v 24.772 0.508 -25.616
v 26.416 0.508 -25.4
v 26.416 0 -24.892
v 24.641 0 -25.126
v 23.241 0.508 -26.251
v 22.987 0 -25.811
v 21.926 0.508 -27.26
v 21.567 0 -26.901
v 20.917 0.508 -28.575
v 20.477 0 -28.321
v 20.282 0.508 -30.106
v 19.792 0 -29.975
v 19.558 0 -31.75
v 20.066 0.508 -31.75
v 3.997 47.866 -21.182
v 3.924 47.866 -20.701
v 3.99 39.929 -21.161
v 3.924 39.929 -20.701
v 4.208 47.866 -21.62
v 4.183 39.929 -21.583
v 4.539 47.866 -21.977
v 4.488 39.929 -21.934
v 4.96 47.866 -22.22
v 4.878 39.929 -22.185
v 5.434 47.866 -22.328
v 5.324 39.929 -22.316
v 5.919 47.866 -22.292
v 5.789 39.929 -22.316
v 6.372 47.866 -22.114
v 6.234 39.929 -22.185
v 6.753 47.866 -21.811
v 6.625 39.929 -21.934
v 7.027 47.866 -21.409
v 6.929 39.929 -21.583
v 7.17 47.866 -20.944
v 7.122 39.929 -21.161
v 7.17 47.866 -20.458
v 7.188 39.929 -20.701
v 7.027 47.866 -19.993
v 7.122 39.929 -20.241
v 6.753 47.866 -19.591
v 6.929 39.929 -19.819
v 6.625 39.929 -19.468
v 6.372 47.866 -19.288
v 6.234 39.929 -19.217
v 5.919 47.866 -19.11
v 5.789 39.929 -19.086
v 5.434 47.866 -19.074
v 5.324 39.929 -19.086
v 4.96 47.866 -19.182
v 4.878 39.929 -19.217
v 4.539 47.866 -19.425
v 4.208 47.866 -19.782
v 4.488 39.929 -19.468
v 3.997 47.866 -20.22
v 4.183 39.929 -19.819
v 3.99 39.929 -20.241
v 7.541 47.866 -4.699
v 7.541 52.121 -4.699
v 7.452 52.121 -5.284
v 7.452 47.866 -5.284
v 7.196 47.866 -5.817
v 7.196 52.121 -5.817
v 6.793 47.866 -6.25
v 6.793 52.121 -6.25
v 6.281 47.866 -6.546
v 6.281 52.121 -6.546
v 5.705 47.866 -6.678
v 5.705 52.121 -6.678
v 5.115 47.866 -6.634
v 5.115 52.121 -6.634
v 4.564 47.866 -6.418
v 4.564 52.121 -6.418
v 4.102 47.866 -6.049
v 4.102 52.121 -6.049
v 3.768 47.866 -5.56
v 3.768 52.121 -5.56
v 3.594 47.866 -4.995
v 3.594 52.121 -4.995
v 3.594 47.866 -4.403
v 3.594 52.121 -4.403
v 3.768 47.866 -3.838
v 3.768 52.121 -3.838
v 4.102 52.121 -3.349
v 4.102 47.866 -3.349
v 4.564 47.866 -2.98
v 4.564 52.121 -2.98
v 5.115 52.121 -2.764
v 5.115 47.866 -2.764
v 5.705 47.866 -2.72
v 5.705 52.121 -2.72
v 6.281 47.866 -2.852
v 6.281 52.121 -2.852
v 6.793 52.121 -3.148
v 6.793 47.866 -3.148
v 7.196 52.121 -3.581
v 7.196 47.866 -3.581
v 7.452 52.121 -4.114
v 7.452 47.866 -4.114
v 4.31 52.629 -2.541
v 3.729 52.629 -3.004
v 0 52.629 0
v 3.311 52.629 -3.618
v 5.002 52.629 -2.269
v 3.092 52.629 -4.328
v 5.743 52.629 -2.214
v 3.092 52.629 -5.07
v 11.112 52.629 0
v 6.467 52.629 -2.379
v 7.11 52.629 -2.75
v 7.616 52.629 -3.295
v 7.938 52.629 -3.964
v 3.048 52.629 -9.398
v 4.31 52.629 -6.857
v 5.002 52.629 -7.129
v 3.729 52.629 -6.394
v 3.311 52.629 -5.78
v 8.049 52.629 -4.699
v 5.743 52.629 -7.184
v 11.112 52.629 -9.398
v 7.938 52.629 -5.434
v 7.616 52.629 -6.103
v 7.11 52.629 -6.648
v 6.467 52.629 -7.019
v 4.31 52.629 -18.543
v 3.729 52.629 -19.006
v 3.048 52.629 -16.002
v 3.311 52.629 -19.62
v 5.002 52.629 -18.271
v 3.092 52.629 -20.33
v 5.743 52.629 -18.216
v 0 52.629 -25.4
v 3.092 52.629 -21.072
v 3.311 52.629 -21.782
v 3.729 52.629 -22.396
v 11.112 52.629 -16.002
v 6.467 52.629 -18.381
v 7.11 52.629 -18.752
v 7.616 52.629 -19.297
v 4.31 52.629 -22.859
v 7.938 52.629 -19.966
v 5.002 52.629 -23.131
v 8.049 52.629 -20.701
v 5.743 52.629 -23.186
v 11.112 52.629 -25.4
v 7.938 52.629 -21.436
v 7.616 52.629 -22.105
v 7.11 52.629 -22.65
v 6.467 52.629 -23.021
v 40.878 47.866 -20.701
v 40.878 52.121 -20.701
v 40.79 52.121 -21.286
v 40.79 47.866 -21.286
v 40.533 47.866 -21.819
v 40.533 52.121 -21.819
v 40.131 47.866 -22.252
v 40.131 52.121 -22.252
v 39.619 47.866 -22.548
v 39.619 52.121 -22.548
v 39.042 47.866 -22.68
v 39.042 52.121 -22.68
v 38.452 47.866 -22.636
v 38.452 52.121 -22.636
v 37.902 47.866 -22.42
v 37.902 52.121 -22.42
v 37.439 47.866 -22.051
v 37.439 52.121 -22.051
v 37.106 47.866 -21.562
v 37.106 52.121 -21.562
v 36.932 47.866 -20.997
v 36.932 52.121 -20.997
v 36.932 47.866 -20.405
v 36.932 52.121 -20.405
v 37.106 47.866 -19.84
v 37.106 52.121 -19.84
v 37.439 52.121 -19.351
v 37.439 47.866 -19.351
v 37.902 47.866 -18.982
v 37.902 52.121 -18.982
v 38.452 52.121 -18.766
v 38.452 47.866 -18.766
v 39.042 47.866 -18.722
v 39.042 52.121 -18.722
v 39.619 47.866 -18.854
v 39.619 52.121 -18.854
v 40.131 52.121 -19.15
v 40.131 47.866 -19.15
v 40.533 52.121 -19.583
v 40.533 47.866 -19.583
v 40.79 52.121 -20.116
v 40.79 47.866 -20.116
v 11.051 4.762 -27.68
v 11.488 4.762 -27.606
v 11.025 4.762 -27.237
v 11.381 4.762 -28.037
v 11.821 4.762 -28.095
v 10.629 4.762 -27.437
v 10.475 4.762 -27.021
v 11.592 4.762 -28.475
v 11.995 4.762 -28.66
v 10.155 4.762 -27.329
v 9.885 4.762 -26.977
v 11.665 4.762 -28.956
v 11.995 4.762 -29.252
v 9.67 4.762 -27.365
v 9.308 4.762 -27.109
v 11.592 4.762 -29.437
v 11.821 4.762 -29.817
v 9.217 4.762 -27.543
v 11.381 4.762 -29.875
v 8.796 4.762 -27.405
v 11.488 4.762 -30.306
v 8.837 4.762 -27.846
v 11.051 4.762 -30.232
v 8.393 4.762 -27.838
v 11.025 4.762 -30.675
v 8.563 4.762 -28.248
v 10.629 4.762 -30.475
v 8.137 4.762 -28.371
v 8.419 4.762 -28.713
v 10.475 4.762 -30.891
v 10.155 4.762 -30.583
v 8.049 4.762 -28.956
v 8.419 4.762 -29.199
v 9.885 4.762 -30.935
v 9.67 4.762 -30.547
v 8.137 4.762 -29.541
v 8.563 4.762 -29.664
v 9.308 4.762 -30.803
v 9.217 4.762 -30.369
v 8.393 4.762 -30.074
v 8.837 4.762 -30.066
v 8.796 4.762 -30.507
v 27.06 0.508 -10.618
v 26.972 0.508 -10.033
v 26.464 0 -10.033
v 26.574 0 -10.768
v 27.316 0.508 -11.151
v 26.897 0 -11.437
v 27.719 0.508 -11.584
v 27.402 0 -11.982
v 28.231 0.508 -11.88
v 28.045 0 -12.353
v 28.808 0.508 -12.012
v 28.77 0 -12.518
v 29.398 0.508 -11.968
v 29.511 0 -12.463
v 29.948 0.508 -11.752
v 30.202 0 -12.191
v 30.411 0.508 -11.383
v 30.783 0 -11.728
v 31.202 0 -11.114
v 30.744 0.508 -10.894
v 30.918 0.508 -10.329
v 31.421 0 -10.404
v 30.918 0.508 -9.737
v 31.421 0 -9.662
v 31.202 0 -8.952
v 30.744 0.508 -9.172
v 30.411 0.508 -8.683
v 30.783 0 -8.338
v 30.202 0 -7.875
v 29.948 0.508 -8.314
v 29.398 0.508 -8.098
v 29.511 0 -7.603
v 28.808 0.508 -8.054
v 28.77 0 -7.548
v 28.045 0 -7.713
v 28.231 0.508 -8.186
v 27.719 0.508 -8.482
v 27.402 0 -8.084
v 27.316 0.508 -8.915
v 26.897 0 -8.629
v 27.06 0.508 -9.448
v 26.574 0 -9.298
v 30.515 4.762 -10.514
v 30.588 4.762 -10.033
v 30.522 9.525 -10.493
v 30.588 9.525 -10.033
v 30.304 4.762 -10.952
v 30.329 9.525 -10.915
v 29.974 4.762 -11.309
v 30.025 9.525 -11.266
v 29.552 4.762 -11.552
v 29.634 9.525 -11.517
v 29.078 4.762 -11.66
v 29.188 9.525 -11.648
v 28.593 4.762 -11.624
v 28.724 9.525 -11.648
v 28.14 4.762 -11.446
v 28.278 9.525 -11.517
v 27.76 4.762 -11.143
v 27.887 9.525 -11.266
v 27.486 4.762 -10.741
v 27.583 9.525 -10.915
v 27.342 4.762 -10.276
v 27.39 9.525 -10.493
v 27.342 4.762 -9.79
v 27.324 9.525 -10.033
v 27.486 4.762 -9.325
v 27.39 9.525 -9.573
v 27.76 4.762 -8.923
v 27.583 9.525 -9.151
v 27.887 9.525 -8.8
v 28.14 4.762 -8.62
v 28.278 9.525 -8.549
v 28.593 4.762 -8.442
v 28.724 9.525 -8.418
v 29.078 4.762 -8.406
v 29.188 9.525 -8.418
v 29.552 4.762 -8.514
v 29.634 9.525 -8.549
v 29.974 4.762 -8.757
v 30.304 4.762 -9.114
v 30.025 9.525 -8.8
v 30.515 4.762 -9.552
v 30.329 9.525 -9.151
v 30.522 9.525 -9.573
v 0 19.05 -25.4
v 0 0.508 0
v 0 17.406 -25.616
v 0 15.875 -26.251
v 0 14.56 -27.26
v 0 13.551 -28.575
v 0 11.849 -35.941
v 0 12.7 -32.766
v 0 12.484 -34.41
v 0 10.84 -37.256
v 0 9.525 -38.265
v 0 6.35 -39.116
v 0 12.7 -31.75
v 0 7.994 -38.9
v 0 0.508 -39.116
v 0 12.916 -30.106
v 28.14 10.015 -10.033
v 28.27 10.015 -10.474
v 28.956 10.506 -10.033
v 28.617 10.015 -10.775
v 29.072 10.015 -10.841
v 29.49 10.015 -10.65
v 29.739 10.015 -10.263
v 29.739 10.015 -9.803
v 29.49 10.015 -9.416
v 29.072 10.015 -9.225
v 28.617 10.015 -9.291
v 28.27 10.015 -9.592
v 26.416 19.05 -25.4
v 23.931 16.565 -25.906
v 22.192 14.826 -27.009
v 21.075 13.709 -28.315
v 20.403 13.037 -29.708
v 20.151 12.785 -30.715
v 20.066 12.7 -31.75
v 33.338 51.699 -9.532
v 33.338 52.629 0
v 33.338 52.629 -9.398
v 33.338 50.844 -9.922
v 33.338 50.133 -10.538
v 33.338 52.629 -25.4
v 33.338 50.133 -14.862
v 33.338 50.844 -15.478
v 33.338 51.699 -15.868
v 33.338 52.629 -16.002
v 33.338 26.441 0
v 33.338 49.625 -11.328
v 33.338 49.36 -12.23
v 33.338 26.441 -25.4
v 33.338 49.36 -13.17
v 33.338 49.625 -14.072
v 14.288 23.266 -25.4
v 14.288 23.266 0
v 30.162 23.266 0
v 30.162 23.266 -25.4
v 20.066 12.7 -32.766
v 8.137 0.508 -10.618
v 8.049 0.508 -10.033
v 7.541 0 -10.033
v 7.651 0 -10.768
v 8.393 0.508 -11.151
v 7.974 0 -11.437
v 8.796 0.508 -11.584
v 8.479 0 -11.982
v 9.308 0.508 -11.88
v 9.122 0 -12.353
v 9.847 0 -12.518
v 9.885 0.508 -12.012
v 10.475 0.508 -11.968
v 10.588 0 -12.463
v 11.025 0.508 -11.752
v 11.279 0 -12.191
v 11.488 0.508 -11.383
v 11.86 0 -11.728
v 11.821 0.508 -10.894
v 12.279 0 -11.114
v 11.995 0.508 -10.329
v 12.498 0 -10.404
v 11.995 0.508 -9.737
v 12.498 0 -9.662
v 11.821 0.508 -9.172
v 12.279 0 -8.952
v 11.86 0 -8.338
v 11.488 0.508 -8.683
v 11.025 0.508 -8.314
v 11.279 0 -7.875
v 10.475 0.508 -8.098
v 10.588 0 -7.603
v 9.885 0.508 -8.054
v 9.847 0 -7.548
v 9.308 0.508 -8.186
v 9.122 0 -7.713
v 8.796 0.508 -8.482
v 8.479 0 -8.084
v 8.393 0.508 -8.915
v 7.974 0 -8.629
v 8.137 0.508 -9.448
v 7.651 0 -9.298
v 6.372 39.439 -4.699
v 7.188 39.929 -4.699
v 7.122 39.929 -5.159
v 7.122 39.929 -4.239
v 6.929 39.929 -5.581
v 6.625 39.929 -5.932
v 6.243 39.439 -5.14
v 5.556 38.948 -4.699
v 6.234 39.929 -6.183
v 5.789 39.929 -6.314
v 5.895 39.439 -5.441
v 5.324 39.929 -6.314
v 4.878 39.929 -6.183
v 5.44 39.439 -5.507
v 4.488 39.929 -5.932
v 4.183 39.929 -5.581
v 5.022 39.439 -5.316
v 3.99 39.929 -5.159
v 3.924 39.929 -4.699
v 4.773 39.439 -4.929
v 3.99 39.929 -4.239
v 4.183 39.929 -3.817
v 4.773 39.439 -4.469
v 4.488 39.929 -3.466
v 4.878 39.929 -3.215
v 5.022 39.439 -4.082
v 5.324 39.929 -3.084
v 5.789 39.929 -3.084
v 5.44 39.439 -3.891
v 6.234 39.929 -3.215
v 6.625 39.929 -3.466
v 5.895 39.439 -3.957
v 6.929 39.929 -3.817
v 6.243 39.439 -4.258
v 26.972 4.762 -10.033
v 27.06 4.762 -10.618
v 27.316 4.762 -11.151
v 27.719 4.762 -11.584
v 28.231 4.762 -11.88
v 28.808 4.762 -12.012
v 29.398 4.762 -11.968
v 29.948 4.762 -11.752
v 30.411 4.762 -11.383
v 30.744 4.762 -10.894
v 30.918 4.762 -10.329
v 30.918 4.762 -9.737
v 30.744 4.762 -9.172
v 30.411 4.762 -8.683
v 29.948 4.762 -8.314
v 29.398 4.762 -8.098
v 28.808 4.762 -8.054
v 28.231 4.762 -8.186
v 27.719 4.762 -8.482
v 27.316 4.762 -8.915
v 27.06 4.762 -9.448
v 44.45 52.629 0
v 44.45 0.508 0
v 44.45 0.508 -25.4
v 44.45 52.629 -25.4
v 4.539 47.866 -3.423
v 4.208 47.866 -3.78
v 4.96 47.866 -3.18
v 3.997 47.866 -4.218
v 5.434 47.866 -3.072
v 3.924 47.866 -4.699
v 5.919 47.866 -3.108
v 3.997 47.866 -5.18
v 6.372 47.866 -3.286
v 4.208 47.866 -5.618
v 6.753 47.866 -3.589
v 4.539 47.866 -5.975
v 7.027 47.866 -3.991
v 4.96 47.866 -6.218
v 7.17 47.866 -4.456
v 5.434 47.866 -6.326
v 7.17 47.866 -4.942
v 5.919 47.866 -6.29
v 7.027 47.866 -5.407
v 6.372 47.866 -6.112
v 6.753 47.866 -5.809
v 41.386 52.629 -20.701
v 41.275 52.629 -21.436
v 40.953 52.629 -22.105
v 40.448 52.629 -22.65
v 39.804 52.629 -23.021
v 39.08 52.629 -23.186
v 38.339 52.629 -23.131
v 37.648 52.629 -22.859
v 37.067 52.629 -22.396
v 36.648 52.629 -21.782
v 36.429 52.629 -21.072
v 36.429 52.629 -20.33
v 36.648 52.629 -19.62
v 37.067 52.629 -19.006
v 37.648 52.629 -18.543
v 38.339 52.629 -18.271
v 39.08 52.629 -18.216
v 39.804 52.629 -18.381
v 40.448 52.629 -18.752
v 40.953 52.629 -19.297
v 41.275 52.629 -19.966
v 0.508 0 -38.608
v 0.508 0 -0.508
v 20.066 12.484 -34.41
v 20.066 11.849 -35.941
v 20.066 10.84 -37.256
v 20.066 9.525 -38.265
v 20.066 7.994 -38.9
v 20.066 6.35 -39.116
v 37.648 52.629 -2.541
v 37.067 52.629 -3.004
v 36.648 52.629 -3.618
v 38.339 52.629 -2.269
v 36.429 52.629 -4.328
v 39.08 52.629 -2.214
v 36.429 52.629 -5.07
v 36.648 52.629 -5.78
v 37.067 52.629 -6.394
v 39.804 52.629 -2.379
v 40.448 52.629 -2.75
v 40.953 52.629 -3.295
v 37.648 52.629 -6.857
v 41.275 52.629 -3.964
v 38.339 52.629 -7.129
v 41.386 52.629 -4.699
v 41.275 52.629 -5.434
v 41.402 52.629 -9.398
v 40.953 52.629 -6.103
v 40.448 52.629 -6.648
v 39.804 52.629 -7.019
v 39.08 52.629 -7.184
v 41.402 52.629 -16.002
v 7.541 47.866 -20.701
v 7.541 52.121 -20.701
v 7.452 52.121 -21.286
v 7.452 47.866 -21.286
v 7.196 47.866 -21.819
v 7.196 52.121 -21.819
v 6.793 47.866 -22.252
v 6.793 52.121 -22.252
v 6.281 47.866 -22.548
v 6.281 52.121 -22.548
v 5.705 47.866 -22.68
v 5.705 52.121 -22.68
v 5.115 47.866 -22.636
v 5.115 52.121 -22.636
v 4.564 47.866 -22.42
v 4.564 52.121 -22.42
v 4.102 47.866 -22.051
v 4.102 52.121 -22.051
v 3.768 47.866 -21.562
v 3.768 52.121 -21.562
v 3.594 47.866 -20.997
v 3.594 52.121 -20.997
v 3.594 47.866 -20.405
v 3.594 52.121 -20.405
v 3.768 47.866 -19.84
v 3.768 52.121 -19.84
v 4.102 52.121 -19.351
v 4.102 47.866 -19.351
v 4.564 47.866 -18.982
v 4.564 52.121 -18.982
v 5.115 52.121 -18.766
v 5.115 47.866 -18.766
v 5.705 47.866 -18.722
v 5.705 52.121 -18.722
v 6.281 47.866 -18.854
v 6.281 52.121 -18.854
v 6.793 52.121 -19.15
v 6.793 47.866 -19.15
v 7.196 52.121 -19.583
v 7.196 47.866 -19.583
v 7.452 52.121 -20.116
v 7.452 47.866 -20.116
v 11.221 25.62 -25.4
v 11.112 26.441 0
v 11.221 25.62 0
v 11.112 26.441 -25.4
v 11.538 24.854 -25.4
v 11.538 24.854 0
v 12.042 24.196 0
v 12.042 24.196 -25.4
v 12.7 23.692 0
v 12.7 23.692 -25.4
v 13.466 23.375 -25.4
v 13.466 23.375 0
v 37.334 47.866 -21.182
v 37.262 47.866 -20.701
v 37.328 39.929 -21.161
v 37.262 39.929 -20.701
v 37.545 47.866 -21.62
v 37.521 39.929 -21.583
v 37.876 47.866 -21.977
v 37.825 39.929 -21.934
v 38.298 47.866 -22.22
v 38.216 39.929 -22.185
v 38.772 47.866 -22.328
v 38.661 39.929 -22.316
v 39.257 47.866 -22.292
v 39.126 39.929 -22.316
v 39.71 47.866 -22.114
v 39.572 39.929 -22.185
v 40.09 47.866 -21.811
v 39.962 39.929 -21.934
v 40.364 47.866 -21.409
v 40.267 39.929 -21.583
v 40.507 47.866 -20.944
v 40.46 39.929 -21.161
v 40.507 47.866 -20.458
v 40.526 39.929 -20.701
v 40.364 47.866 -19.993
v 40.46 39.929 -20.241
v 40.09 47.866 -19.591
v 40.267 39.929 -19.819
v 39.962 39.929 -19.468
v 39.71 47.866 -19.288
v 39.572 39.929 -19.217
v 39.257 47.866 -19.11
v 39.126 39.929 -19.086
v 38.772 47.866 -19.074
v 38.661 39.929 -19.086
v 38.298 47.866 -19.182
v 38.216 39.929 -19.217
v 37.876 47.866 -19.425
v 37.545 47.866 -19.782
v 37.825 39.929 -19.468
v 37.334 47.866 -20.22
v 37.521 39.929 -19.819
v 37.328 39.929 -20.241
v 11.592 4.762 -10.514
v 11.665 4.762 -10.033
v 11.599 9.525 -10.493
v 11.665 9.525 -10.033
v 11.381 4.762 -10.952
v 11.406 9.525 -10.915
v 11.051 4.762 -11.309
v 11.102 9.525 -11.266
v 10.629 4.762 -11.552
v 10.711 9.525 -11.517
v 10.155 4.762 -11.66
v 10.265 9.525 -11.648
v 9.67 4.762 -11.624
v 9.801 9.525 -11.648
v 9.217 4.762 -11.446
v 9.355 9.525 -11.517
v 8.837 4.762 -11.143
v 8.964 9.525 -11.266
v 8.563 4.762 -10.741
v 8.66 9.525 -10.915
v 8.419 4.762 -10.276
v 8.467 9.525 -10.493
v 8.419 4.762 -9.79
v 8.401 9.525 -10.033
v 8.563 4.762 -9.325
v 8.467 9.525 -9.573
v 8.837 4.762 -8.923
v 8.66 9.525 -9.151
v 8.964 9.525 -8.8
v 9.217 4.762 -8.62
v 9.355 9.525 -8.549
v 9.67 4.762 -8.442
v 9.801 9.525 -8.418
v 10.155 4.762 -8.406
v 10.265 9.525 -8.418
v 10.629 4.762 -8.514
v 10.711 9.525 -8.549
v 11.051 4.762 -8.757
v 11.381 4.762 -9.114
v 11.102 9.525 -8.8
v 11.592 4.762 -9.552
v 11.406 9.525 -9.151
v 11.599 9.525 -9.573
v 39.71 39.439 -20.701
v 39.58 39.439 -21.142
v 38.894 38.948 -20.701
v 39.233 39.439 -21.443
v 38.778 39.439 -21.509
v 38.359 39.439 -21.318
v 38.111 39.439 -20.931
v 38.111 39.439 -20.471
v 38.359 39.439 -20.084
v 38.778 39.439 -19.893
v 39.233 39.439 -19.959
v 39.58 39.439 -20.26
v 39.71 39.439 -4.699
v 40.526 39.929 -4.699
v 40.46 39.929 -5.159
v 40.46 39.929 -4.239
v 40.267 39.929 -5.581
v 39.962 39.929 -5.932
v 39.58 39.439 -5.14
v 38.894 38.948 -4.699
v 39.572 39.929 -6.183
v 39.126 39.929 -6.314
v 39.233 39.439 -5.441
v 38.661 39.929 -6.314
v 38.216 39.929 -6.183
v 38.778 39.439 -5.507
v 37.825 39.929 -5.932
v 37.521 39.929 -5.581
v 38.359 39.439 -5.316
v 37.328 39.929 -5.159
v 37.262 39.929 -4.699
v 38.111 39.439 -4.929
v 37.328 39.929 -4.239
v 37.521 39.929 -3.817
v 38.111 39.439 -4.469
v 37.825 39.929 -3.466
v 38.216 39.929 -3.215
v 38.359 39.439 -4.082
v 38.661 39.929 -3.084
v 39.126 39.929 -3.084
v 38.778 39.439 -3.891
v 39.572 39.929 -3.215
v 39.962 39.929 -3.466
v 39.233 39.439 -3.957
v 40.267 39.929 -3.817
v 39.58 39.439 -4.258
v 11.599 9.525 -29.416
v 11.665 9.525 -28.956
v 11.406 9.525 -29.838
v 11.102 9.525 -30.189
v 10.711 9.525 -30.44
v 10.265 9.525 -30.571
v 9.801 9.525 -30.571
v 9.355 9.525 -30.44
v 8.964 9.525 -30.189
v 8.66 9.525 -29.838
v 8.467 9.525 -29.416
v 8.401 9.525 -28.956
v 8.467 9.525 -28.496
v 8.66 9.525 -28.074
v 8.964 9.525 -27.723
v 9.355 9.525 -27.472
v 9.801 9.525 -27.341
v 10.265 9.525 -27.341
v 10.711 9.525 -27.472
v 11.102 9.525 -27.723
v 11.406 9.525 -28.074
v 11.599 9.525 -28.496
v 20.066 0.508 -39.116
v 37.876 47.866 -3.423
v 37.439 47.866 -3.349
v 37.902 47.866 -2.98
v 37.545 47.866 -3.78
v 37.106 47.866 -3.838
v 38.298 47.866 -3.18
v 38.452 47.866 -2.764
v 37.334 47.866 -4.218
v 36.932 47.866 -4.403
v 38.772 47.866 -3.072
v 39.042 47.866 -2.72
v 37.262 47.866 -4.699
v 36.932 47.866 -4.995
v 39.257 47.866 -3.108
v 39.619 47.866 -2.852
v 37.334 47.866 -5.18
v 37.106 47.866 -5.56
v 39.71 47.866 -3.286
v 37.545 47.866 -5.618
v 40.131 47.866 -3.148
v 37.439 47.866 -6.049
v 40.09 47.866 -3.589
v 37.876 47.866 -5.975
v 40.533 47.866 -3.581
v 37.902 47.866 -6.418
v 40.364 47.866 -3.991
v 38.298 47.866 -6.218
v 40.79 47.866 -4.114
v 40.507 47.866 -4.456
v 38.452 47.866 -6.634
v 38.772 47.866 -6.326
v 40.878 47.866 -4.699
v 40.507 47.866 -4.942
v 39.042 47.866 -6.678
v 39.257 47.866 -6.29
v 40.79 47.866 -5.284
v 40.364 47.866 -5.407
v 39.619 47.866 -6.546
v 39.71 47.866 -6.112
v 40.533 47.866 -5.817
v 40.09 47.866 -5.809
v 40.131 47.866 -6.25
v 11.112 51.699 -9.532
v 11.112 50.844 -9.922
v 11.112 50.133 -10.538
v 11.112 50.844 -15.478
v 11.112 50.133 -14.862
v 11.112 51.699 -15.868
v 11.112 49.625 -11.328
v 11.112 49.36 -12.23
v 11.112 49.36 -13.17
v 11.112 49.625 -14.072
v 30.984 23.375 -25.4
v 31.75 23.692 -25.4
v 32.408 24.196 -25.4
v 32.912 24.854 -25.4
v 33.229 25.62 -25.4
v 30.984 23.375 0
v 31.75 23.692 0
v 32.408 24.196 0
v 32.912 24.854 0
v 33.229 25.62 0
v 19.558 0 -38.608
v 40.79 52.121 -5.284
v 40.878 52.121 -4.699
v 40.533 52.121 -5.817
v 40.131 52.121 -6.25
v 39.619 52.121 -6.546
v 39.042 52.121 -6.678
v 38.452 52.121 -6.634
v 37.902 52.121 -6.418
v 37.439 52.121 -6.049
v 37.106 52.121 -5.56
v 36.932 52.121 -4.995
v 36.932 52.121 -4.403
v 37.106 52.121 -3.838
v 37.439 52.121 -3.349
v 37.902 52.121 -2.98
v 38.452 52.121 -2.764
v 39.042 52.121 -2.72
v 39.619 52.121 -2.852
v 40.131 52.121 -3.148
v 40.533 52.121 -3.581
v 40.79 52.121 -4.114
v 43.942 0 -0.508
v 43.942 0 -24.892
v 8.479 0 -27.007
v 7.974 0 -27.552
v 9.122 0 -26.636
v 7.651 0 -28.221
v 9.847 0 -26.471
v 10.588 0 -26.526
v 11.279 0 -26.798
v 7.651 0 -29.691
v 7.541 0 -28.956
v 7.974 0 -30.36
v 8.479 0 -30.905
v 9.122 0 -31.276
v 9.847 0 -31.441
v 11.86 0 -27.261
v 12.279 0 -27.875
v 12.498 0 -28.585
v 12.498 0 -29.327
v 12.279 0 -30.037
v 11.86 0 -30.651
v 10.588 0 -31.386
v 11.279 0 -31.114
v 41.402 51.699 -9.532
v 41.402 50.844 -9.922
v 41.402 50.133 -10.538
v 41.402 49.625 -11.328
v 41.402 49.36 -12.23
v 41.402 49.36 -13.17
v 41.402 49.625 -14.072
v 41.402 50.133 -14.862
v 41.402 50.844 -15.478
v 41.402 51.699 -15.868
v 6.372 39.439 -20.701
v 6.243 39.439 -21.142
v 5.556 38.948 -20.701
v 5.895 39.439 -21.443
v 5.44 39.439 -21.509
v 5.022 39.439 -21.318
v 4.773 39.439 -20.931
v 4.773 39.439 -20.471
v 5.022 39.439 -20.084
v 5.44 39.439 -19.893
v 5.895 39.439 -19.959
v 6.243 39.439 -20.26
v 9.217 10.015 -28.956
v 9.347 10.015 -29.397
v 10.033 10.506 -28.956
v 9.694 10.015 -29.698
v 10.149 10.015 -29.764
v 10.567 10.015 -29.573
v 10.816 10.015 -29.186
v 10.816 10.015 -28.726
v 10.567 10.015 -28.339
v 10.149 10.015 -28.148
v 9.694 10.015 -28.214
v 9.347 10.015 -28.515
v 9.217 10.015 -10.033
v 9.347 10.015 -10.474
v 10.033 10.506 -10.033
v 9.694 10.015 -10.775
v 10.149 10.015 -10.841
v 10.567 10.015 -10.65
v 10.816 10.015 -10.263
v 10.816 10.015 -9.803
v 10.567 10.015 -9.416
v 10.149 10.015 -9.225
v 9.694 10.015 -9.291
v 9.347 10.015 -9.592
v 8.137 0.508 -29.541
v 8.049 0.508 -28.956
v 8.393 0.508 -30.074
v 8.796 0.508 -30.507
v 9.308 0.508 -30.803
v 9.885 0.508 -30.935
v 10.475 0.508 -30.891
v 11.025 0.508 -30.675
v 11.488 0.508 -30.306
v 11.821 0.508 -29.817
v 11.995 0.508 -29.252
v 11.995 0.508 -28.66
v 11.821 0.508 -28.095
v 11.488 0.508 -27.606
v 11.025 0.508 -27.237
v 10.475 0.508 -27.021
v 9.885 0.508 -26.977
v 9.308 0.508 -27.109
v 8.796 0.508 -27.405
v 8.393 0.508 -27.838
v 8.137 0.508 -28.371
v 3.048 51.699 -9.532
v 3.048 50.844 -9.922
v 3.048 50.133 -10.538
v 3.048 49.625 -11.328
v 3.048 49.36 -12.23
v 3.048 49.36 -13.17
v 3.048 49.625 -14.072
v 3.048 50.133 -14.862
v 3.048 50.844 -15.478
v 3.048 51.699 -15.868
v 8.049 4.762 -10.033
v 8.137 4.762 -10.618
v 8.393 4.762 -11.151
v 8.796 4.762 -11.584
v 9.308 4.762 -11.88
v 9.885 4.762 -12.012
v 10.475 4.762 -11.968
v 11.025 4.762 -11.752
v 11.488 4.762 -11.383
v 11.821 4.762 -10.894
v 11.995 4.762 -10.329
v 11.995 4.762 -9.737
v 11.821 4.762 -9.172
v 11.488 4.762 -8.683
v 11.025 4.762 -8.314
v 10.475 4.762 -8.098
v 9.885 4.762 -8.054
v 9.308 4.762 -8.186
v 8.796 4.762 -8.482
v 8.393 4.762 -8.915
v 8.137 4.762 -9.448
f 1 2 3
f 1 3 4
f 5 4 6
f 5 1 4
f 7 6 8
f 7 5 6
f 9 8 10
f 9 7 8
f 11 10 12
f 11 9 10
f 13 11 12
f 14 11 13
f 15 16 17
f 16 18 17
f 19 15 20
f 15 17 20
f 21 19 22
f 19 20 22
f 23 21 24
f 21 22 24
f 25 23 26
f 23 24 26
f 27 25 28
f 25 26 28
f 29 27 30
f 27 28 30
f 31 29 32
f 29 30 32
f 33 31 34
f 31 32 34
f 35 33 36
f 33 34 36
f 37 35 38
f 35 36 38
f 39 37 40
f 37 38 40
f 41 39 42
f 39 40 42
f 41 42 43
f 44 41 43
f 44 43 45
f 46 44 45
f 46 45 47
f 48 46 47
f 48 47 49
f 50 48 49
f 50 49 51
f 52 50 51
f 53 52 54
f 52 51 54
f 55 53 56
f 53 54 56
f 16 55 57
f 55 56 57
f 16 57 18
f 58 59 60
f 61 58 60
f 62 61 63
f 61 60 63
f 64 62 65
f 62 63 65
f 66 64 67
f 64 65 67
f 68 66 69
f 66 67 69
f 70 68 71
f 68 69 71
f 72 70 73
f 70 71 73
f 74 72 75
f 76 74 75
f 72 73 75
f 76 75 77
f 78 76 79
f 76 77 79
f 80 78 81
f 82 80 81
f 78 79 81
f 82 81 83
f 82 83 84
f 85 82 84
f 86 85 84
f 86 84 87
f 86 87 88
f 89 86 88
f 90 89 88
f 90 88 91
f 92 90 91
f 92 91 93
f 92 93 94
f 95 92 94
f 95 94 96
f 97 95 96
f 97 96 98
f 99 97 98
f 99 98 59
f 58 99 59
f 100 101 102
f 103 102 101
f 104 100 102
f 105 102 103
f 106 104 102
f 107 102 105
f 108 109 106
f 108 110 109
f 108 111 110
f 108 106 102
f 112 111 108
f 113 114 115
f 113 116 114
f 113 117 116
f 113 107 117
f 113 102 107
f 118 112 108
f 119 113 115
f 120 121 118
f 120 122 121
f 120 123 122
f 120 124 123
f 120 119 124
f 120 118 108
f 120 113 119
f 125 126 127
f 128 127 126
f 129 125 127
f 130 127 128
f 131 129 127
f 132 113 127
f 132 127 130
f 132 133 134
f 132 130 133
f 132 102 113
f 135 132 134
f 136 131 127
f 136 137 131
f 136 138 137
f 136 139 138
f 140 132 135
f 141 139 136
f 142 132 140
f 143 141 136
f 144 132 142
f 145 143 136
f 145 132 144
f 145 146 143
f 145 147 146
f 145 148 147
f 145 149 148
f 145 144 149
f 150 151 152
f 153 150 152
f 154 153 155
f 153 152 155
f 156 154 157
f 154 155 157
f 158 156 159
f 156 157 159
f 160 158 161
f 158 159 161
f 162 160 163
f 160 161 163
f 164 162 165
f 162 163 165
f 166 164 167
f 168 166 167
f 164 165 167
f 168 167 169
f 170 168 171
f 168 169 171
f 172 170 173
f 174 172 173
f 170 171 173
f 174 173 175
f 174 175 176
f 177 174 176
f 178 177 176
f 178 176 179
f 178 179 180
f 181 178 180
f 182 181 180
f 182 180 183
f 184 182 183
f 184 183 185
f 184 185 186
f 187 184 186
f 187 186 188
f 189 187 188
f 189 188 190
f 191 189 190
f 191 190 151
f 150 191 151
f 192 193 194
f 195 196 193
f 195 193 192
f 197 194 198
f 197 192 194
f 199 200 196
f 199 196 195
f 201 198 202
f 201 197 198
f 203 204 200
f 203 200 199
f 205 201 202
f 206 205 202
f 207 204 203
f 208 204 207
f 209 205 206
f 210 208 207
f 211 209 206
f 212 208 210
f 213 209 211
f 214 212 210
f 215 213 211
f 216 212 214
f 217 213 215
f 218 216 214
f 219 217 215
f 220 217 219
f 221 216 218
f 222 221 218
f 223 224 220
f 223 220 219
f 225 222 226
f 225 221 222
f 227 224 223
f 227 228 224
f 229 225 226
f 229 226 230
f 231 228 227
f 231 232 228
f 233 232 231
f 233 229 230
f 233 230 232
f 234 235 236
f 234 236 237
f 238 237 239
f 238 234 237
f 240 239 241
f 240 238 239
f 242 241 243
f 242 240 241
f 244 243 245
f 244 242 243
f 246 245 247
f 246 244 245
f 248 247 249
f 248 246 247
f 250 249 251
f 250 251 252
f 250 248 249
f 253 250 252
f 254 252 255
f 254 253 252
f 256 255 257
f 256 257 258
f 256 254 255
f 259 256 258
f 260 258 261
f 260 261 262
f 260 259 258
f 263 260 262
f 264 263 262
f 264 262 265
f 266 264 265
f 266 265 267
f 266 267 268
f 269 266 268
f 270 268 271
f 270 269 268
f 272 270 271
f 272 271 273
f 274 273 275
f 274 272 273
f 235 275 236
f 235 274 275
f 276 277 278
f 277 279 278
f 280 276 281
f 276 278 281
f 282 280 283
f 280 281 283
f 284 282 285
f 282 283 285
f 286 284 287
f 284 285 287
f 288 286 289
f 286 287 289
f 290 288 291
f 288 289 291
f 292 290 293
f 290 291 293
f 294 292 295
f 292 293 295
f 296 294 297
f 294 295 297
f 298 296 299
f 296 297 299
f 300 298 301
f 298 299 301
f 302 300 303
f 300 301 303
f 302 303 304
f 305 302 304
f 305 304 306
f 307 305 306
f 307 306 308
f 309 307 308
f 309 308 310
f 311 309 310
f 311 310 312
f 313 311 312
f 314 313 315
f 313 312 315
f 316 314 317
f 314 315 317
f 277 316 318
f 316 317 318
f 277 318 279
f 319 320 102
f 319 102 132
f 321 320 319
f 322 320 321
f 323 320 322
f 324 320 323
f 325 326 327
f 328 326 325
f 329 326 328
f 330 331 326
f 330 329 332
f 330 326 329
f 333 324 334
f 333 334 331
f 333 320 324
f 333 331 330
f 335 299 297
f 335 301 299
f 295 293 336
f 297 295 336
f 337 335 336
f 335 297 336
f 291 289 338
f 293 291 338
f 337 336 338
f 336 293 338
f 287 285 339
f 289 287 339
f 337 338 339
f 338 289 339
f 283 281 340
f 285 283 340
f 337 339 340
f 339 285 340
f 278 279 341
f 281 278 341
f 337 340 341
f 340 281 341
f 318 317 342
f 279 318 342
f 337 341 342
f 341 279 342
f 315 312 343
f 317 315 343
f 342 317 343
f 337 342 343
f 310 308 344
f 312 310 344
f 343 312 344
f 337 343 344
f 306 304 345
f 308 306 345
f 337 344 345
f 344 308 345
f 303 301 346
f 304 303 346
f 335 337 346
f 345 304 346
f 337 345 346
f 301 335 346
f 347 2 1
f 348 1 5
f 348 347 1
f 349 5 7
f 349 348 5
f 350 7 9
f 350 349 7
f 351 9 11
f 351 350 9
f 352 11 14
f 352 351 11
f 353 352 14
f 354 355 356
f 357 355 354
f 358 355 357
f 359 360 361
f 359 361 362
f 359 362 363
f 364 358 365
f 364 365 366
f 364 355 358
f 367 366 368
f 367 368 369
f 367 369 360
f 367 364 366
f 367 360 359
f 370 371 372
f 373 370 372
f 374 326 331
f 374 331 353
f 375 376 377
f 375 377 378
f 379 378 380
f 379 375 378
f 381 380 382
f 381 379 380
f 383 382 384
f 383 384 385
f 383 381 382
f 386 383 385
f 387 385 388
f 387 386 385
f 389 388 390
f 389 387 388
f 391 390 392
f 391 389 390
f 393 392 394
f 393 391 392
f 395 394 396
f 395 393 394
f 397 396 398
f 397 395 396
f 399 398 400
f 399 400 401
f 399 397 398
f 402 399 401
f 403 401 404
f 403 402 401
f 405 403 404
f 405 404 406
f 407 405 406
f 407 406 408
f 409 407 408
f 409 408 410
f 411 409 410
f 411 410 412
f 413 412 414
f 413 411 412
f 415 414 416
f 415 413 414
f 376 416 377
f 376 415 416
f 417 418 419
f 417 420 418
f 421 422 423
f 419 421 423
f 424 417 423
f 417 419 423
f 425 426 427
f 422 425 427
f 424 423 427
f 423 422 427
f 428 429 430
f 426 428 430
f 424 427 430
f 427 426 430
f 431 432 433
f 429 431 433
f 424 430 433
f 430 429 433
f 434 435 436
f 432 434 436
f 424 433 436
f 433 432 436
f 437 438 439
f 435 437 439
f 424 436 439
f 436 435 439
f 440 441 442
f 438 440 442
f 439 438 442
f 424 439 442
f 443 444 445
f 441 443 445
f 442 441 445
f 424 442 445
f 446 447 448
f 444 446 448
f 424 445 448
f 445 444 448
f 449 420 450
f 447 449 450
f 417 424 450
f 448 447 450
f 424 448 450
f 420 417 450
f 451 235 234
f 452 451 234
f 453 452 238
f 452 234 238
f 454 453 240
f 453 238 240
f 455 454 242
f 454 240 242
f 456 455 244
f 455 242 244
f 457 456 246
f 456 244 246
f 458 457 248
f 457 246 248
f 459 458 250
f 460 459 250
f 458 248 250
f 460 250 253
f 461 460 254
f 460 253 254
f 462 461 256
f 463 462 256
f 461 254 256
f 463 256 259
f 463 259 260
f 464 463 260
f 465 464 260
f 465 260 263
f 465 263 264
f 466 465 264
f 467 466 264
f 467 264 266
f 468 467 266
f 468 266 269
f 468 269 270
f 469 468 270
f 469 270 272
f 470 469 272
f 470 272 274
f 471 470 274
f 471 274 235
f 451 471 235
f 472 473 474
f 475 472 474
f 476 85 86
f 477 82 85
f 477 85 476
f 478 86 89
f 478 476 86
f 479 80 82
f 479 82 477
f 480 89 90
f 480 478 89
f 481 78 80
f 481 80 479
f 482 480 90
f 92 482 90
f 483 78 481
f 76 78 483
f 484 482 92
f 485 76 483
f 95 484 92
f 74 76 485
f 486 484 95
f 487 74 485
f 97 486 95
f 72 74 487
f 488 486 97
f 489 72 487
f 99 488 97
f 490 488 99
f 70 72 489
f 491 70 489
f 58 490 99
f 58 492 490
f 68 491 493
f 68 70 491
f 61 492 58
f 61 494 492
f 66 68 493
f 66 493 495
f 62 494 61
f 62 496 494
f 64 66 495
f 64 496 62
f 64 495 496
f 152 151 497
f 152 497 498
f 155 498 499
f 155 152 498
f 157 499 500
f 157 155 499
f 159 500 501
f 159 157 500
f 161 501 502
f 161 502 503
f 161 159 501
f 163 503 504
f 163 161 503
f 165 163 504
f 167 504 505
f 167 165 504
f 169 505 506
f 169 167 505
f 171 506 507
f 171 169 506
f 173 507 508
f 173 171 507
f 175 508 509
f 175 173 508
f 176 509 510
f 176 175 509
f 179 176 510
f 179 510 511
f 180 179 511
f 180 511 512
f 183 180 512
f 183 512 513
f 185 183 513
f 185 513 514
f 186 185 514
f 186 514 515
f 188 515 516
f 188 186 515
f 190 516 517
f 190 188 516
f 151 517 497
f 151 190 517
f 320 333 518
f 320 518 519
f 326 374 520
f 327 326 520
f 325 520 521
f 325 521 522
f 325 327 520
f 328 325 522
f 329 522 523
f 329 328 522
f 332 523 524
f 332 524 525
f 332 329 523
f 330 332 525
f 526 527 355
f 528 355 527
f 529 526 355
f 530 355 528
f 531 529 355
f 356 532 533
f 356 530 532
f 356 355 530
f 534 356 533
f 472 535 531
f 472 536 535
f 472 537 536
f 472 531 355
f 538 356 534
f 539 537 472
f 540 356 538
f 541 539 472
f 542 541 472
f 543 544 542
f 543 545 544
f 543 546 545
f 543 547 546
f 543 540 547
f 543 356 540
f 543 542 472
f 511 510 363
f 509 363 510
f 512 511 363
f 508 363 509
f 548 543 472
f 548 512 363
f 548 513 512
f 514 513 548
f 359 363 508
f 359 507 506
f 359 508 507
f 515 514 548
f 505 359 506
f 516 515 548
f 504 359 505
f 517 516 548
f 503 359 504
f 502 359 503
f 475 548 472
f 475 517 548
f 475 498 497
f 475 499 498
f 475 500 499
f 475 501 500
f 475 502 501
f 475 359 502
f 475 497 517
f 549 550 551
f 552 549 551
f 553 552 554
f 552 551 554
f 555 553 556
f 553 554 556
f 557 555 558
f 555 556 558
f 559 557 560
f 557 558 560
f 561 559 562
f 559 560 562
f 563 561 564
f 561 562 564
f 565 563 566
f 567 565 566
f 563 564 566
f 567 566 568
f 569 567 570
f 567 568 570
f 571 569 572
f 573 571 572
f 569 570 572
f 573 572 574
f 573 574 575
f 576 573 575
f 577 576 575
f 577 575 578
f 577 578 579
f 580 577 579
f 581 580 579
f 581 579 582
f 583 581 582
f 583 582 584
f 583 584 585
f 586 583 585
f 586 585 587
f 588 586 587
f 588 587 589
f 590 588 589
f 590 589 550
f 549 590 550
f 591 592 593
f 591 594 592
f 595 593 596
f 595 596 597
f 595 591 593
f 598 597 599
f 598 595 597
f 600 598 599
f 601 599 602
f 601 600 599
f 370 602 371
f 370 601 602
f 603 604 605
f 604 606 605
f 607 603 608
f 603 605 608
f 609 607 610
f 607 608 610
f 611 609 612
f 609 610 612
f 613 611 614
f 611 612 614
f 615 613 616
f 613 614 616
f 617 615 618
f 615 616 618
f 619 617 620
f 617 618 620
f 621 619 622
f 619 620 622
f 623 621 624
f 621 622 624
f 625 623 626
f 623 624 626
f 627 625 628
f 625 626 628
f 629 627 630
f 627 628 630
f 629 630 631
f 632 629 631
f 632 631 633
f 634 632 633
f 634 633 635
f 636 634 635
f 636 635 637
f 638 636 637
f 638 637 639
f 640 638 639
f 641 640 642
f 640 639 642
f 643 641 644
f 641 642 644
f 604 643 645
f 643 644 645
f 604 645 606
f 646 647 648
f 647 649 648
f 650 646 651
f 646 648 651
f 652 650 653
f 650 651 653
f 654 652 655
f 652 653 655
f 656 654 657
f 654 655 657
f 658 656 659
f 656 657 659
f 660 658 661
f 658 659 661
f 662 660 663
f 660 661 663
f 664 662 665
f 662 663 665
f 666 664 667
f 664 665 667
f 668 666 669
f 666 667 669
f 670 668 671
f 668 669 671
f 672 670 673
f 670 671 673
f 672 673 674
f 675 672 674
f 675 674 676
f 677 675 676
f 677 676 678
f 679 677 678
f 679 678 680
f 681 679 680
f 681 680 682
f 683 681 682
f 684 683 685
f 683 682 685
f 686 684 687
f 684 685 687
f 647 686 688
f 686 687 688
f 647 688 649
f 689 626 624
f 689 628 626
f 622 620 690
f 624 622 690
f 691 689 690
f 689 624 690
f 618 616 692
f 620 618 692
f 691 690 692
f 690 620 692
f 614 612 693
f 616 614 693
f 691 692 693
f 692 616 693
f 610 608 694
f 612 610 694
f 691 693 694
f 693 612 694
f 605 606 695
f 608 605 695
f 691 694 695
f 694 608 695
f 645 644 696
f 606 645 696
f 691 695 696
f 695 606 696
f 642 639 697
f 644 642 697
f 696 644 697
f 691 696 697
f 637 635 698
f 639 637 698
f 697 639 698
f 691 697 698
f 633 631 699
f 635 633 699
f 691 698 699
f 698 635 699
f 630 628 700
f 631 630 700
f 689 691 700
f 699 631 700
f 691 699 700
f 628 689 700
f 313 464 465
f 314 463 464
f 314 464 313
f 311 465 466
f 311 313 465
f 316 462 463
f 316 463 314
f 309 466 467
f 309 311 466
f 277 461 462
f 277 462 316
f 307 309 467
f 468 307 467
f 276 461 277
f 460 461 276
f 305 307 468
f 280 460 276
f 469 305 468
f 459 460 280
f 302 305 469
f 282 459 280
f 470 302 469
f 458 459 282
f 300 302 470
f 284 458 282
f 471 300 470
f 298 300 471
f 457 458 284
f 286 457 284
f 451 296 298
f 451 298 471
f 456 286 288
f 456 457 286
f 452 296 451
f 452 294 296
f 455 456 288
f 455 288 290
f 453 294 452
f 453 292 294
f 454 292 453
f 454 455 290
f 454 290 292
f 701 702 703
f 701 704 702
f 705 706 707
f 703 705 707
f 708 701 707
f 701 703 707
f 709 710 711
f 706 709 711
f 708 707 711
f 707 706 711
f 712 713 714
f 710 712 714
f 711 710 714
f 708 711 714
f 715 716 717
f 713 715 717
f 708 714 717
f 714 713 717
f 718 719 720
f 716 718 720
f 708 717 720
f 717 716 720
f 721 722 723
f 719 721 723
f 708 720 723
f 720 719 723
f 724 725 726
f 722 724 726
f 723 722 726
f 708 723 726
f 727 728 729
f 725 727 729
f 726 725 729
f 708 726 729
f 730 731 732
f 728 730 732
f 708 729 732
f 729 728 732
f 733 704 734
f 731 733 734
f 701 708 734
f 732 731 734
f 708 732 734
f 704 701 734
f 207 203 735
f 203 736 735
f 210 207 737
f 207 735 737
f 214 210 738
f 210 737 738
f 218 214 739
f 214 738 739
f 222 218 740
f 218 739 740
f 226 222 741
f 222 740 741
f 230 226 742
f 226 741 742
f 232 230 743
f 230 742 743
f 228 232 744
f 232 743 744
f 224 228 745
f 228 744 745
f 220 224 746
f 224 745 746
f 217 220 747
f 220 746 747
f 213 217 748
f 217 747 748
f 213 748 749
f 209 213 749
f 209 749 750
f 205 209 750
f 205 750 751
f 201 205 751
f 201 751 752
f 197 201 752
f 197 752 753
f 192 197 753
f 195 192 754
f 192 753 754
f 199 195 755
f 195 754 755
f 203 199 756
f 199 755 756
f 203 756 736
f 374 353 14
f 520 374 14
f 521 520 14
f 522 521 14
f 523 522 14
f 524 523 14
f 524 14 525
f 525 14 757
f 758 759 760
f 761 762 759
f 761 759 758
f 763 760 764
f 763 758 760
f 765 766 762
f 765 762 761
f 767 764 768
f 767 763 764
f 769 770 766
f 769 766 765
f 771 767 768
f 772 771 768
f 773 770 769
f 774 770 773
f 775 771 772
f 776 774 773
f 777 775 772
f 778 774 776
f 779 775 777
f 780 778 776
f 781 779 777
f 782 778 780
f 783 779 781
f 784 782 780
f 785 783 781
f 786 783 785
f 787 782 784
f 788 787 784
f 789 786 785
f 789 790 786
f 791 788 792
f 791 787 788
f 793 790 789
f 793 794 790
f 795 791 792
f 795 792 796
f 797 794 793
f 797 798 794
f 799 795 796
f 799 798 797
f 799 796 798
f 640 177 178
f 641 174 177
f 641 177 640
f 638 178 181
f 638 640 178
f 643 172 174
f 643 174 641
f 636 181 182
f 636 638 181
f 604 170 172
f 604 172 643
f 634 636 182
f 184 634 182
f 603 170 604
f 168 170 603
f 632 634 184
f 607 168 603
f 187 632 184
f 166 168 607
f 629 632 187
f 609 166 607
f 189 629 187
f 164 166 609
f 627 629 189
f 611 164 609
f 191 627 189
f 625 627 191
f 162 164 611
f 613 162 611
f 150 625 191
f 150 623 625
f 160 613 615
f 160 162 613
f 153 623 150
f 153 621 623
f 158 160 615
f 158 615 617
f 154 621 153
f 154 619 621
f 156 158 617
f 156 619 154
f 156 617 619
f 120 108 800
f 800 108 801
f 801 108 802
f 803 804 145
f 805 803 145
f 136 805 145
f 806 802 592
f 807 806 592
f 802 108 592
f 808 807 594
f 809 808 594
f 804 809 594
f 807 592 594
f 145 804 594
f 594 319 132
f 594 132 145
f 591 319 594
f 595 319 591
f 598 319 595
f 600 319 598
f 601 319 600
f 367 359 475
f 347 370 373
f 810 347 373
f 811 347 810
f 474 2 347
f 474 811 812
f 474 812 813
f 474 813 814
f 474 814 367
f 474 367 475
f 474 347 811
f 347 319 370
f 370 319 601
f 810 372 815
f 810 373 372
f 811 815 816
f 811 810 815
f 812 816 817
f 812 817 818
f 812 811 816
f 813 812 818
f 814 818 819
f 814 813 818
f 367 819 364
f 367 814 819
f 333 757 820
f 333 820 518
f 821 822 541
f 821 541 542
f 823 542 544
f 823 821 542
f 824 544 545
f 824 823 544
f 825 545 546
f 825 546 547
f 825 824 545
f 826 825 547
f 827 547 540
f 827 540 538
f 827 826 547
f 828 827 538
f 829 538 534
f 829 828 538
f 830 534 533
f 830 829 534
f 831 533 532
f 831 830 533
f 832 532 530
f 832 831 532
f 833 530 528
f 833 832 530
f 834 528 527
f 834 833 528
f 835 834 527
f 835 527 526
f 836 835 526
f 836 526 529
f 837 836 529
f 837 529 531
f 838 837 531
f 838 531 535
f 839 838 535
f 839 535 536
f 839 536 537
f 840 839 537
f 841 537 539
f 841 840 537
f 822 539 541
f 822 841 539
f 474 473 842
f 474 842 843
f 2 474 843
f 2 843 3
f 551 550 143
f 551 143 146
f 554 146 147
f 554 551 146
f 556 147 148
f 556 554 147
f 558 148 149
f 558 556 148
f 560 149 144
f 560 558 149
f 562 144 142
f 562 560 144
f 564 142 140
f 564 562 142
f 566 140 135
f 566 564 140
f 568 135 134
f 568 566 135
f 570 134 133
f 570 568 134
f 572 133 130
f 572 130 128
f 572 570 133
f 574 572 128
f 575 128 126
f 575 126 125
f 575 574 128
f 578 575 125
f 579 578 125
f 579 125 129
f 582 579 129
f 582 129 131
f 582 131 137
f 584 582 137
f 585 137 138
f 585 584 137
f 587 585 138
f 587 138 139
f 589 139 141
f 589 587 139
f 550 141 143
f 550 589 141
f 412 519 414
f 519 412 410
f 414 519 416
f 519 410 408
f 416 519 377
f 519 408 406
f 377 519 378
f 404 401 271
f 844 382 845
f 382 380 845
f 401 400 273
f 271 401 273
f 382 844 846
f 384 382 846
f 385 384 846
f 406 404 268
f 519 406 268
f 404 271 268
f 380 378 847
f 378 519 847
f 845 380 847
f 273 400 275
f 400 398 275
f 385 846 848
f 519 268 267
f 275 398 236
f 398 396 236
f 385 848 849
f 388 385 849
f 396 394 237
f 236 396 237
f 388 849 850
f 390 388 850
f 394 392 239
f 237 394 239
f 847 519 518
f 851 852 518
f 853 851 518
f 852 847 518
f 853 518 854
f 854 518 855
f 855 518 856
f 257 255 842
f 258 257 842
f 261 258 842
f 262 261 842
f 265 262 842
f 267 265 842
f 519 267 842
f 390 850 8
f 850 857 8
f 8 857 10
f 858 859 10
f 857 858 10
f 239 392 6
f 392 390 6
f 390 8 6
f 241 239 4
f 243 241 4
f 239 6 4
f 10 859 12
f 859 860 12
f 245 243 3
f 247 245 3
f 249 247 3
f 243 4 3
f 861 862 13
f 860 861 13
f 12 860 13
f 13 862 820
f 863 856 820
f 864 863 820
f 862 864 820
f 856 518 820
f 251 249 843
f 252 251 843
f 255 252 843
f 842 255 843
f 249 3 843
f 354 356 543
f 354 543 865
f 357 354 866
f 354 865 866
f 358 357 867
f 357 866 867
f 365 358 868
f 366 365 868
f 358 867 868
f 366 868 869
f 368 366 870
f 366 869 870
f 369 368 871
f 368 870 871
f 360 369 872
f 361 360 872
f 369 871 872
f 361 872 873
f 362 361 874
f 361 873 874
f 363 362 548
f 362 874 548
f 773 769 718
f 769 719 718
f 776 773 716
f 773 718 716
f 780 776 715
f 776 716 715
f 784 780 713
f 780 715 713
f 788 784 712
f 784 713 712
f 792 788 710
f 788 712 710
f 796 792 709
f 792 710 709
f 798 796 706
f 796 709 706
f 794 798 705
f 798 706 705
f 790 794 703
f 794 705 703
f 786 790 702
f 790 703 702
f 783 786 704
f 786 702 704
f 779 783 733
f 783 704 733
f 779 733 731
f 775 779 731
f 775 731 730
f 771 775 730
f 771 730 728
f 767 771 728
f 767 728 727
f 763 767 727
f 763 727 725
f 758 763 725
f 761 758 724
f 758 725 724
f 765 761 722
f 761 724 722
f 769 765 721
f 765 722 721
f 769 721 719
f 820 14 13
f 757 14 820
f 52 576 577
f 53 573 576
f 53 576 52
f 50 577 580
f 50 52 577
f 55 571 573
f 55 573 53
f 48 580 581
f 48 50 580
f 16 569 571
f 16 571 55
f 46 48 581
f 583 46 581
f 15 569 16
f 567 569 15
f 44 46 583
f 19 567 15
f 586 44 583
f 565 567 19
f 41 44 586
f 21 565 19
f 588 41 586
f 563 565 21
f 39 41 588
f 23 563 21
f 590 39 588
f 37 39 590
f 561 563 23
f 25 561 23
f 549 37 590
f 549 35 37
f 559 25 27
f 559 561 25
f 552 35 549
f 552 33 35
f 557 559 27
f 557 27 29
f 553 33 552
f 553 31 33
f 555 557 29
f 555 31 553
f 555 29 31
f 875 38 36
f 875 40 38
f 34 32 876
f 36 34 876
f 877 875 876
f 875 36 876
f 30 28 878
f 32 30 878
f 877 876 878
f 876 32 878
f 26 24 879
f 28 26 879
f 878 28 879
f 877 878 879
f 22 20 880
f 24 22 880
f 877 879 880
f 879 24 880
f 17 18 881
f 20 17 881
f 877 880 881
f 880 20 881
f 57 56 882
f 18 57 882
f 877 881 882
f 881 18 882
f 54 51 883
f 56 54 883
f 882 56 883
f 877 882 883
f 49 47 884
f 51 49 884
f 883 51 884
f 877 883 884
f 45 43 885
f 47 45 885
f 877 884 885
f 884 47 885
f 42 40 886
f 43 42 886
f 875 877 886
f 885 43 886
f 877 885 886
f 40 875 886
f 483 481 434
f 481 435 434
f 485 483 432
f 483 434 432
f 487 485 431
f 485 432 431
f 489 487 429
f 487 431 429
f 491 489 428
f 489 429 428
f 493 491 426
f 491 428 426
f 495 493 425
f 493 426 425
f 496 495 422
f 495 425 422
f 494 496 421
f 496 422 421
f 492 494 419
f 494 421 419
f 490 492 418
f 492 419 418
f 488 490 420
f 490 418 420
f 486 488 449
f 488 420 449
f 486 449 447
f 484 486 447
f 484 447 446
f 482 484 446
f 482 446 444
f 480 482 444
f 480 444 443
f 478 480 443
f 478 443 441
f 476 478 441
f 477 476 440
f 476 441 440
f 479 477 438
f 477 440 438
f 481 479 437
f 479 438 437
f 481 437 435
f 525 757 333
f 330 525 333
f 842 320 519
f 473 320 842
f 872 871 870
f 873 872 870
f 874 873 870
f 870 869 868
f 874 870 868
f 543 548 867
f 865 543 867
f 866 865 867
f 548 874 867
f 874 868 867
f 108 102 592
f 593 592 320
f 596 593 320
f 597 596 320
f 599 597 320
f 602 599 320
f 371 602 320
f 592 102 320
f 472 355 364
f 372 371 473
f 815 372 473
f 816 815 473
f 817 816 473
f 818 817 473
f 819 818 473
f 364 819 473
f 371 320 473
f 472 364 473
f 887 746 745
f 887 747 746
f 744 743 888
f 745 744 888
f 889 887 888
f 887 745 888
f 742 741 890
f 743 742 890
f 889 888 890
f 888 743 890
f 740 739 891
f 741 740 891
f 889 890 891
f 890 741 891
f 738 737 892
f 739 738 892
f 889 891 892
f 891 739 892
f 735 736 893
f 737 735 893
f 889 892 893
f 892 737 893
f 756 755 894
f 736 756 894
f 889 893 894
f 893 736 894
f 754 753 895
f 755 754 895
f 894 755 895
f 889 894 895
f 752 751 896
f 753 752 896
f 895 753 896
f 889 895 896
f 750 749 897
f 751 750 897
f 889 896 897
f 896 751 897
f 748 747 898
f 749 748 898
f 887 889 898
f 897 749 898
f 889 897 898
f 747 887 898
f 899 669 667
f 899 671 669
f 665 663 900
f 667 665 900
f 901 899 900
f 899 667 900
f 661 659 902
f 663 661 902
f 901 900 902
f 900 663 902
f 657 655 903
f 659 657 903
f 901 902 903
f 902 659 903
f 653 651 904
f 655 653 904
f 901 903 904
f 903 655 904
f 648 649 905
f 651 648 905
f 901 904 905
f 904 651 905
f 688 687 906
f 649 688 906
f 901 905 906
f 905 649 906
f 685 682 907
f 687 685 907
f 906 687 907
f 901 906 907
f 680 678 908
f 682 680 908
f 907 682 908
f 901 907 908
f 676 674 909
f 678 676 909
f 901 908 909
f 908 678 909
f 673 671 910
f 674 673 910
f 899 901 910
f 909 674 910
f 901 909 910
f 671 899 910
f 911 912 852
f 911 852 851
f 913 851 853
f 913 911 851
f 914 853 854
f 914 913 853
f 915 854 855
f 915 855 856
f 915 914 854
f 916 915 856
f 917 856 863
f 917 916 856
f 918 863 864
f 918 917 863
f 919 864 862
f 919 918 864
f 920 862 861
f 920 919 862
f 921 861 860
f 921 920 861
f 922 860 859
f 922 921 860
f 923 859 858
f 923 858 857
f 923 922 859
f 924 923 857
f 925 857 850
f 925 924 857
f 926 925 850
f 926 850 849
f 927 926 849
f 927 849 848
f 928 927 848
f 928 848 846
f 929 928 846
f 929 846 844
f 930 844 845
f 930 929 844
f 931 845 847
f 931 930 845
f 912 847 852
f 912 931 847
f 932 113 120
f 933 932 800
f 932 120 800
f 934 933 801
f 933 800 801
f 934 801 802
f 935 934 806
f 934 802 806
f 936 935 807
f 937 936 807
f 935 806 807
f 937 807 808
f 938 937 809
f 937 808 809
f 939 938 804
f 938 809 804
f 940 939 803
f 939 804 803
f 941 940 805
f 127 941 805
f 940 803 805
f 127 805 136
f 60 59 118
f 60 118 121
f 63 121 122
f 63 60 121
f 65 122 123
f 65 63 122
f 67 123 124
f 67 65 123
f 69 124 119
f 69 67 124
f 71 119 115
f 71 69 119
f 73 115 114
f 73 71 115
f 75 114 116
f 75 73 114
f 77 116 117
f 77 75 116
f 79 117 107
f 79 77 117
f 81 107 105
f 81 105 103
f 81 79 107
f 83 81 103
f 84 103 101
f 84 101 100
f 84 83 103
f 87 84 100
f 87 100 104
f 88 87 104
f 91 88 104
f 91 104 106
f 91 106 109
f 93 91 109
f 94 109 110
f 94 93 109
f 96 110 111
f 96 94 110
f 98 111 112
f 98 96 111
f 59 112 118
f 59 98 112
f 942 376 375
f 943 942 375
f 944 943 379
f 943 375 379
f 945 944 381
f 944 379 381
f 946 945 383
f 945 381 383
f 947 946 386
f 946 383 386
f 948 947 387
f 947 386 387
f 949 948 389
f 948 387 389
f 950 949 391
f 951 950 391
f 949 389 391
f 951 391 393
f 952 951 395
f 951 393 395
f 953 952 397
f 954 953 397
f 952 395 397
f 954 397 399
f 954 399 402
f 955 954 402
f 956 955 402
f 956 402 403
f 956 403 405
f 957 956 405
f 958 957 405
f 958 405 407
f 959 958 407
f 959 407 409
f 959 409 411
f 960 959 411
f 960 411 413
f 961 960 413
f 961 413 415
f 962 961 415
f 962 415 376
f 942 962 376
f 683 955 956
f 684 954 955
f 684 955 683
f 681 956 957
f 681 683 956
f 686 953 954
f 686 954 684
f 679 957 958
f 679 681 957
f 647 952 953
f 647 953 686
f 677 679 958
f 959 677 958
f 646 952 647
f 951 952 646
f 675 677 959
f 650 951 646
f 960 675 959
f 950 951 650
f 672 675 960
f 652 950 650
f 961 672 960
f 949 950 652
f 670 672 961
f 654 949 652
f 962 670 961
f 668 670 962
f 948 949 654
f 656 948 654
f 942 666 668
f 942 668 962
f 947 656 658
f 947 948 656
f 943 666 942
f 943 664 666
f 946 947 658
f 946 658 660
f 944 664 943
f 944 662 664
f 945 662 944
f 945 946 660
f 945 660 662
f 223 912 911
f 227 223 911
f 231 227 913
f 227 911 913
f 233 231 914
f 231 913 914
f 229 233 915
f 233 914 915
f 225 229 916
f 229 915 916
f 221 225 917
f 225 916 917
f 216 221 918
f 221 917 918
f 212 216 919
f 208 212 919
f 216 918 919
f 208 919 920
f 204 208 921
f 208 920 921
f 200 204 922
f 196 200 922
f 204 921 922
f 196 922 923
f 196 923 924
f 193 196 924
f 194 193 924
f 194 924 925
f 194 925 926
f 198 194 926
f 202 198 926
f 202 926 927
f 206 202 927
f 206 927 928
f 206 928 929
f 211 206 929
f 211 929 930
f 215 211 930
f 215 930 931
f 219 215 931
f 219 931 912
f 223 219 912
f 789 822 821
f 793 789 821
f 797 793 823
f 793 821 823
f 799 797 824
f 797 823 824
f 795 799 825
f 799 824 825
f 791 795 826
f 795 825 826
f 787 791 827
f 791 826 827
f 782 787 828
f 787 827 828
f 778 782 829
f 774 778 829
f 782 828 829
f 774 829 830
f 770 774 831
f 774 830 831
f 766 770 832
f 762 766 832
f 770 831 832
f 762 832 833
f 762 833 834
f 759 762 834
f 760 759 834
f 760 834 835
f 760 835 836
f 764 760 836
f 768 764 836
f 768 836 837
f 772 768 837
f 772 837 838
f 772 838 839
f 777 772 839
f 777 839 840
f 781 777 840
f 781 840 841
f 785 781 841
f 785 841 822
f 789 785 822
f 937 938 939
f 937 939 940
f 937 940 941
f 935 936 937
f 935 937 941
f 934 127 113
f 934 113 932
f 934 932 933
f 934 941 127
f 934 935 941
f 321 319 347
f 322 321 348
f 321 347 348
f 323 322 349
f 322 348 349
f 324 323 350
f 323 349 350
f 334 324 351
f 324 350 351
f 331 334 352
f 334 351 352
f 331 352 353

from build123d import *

# Parameters (mm, degrees)
L_BASE_DEPTH                                = 12.7
SKETCH3_W                                   = 44.45
SKETCH3_H                                   = 25.4
RECTANGULAR_EXTRUDE_DEPTH                   = 10.5664
SKETCH4_W                                   = 11.1125
SKETCH4_H                                   = 25.4
FORK_EXTRUDE_DEPTH                          = 29.3624
SKETCH6_W                                   = 38.354
SKETCH6_H                                   = 3.302
F_4_EXPANSION_INSERT_RECESSES_1_D           = 3.2639
F_4_EXPANSION_INSERT_RECESSES_1_DEPTH       = 12.7
F_4_EXPANSION_INSERT_RECESSES_1_CBORE_D     = 3.96875
F_4_EXPANSION_INSERT_RECESSES_1_CBORE_DEPTH = 4.7625
F_4_EXPANSION_INSERT_RECESSES_1_TIP         = 0.980574487
F_4_EXPANSION_INSERT_RECESSES_2_D           = 3.2639
F_4_EXPANSION_INSERT_RECESSES_2_DEPTH       = 9.525
F_4_EXPANSION_INSERT_RECESSES_2_CBORE_D     = 3.96875
F_4_EXPANSION_INSERT_RECESSES_2_CBORE_DEPTH = 4.7625
F_4_EXPANSION_INSERT_RECESSES_2_TIP         = 0.980574487
L_BASE_FILLET_R                             = 6.35
FORK_FILLET_R                               = 3.175
INSTALLATION_CHAMFERS_1_SIZE                = 0.508
INSTALLATION_CHAMFERS_2_SIZE                = 0.508
PRINT_BED_CHAMFER_SIZE                      = 0.508


with BuildPart() as part:
    # Sketch1 → L-Base (new body)
    with BuildSketch(Plane(origin=(0, 0, 0), x_dir=(1, 0, 0), z_dir=(0, 1, 0))):
        Polygon((0, 0), (44.45, 0), (44.45, 25.4), (20.066, 25.4), (20.066, 39.116), (0, 39.116), align=None)
    extrude(amount=L_BASE_DEPTH)

    # Sketch3 → Rectangular Extrude (add)
    with BuildSketch(Plane(origin=(0, 12.7, 0), x_dir=(1, 0, 0), z_dir=(0, 1, 0))):
        with Locations((22.225, 12.7)):
            Rectangle(SKETCH3_W, SKETCH3_H)
    extrude(amount=RECTANGULAR_EXTRUDE_DEPTH)

    # Sketch4 → Fork Extrude (add)
    with BuildSketch(Plane(origin=(0, 23.2664, 0), x_dir=(1, 0, 0), z_dir=(0, 1, 0))):
        with Locations((5.55625, 12.7)):
            Rectangle(SKETCH4_W, SKETCH4_H)
        with Locations((38.89375, 12.7)):
            Rectangle(SKETCH4_W, SKETCH4_H)
    extrude(amount=FORK_EXTRUDE_DEPTH)

    # Sketch6 → Shaft Recess (revolve, cut)
    with BuildSketch(Plane(origin=(0, 52.6288, 0), x_dir=(1, 0, 0), z_dir=(0, 1, 0))):
        with Locations((22.225, 11.049)):
            Rectangle(SKETCH6_W, SKETCH6_H)
    revolve(axis=Axis((0, 52.6288, -12.7), (1, 0, 0)), mode=Mode.SUBTRACT)

    # #4 Expansion Insert Recesses #1
    with Locations(Plane(origin=(0, 52.6288, 0), x_dir=(1, 0, 0), z_dir=(0, 1, 0))):
        with Locations((5.55625, 20.701), (5.55625, 4.699), (38.89375, 20.701), (38.89375, 4.699)):
            CounterBoreHole(F_4_EXPANSION_INSERT_RECESSES_1_D / 2, F_4_EXPANSION_INSERT_RECESSES_1_CBORE_D / 2, F_4_EXPANSION_INSERT_RECESSES_1_CBORE_DEPTH, depth=F_4_EXPANSION_INSERT_RECESSES_1_DEPTH)
            with Locations((0, 0, -(F_4_EXPANSION_INSERT_RECESSES_1_DEPTH + F_4_EXPANSION_INSERT_RECESSES_1_TIP / 2))):  # 118° drill point
                Cone(0, F_4_EXPANSION_INSERT_RECESSES_1_D / 2, F_4_EXPANSION_INSERT_RECESSES_1_TIP, mode=Mode.SUBTRACT)

    # #4 Expansion Insert Recesses #2
    with Locations(Plane(origin=(0, 0, 0), x_dir=(-1, 0, 0), z_dir=(0, -1, 0))):
        with Locations((-10.033, 10.033), (-28.956, 10.033), (-10.033, 28.956)):
            CounterBoreHole(F_4_EXPANSION_INSERT_RECESSES_2_D / 2, F_4_EXPANSION_INSERT_RECESSES_2_CBORE_D / 2, F_4_EXPANSION_INSERT_RECESSES_2_CBORE_DEPTH, depth=F_4_EXPANSION_INSERT_RECESSES_2_DEPTH)
            with Locations((0, 0, -(F_4_EXPANSION_INSERT_RECESSES_2_DEPTH + F_4_EXPANSION_INSERT_RECESSES_2_TIP / 2))):  # 118° drill point
                Cone(0, F_4_EXPANSION_INSERT_RECESSES_2_D / 2, F_4_EXPANSION_INSERT_RECESSES_2_TIP, mode=Mode.SUBTRACT)

    # L-Base Fillet
    l_base_fillet_edges = [part.edges().sort_by_distance(p)[0] for p in [
        (10.033, 12.7, -39.116),
        (10.033, 12.7, -25.4),
        (20.066, 6.35, -25.4),
    ]]
    fillet(l_base_fillet_edges, radius=L_BASE_FILLET_R)

    # Fork Fillet
    fork_fillet_edges = [part.edges().sort_by_distance(p)[0] for p in [
        (33.3375, 23.2664, -12.7),
        (11.1125, 23.2664, -12.7),
    ]]
    fillet(fork_fillet_edges, radius=FORK_FILLET_R)

    # Installation Chamfers #1
    installation_chamfers_1_edges = [part.edges().sort_by_distance(p)[0] for p in [
        (36.909375, 52.6288, -4.699),
        (36.909375, 52.6288, -20.701),
        (3.571875, 52.6288, -4.699),
        (3.571875, 52.6288, -20.701),
    ]]
    chamfer(installation_chamfers_1_edges, length=INSTALLATION_CHAMFERS_1_SIZE)

    # Installation Chamfers #2
    installation_chamfers_2_edges = [part.edges().sort_by_distance(p)[0] for p in [
        (30.940375, 0, -10.033),
        (12.017375, 0, -10.033),
        (12.017375, 0, -28.956),
    ]]
    chamfer(installation_chamfers_2_edges, length=INSTALLATION_CHAMFERS_2_SIZE)

    # Print Bed Chamfer
    print_bed_chamfer_edges = [part.edges().sort_by_distance(p)[0] for p in [
        (20.066, 0, -35.433),
        (21.925871939, 0, -27.259871939),
        (10.033, 0, -39.116),
        (35.433, 0, -25.4),
        (44.45, 0, -12.7),
        (22.225, 0, 0),
        (0, 0, -19.558),
    ]]
    chamfer(print_bed_chamfer_edges, length=PRINT_BED_CHAMFER_SIZE)


solid = part.part
